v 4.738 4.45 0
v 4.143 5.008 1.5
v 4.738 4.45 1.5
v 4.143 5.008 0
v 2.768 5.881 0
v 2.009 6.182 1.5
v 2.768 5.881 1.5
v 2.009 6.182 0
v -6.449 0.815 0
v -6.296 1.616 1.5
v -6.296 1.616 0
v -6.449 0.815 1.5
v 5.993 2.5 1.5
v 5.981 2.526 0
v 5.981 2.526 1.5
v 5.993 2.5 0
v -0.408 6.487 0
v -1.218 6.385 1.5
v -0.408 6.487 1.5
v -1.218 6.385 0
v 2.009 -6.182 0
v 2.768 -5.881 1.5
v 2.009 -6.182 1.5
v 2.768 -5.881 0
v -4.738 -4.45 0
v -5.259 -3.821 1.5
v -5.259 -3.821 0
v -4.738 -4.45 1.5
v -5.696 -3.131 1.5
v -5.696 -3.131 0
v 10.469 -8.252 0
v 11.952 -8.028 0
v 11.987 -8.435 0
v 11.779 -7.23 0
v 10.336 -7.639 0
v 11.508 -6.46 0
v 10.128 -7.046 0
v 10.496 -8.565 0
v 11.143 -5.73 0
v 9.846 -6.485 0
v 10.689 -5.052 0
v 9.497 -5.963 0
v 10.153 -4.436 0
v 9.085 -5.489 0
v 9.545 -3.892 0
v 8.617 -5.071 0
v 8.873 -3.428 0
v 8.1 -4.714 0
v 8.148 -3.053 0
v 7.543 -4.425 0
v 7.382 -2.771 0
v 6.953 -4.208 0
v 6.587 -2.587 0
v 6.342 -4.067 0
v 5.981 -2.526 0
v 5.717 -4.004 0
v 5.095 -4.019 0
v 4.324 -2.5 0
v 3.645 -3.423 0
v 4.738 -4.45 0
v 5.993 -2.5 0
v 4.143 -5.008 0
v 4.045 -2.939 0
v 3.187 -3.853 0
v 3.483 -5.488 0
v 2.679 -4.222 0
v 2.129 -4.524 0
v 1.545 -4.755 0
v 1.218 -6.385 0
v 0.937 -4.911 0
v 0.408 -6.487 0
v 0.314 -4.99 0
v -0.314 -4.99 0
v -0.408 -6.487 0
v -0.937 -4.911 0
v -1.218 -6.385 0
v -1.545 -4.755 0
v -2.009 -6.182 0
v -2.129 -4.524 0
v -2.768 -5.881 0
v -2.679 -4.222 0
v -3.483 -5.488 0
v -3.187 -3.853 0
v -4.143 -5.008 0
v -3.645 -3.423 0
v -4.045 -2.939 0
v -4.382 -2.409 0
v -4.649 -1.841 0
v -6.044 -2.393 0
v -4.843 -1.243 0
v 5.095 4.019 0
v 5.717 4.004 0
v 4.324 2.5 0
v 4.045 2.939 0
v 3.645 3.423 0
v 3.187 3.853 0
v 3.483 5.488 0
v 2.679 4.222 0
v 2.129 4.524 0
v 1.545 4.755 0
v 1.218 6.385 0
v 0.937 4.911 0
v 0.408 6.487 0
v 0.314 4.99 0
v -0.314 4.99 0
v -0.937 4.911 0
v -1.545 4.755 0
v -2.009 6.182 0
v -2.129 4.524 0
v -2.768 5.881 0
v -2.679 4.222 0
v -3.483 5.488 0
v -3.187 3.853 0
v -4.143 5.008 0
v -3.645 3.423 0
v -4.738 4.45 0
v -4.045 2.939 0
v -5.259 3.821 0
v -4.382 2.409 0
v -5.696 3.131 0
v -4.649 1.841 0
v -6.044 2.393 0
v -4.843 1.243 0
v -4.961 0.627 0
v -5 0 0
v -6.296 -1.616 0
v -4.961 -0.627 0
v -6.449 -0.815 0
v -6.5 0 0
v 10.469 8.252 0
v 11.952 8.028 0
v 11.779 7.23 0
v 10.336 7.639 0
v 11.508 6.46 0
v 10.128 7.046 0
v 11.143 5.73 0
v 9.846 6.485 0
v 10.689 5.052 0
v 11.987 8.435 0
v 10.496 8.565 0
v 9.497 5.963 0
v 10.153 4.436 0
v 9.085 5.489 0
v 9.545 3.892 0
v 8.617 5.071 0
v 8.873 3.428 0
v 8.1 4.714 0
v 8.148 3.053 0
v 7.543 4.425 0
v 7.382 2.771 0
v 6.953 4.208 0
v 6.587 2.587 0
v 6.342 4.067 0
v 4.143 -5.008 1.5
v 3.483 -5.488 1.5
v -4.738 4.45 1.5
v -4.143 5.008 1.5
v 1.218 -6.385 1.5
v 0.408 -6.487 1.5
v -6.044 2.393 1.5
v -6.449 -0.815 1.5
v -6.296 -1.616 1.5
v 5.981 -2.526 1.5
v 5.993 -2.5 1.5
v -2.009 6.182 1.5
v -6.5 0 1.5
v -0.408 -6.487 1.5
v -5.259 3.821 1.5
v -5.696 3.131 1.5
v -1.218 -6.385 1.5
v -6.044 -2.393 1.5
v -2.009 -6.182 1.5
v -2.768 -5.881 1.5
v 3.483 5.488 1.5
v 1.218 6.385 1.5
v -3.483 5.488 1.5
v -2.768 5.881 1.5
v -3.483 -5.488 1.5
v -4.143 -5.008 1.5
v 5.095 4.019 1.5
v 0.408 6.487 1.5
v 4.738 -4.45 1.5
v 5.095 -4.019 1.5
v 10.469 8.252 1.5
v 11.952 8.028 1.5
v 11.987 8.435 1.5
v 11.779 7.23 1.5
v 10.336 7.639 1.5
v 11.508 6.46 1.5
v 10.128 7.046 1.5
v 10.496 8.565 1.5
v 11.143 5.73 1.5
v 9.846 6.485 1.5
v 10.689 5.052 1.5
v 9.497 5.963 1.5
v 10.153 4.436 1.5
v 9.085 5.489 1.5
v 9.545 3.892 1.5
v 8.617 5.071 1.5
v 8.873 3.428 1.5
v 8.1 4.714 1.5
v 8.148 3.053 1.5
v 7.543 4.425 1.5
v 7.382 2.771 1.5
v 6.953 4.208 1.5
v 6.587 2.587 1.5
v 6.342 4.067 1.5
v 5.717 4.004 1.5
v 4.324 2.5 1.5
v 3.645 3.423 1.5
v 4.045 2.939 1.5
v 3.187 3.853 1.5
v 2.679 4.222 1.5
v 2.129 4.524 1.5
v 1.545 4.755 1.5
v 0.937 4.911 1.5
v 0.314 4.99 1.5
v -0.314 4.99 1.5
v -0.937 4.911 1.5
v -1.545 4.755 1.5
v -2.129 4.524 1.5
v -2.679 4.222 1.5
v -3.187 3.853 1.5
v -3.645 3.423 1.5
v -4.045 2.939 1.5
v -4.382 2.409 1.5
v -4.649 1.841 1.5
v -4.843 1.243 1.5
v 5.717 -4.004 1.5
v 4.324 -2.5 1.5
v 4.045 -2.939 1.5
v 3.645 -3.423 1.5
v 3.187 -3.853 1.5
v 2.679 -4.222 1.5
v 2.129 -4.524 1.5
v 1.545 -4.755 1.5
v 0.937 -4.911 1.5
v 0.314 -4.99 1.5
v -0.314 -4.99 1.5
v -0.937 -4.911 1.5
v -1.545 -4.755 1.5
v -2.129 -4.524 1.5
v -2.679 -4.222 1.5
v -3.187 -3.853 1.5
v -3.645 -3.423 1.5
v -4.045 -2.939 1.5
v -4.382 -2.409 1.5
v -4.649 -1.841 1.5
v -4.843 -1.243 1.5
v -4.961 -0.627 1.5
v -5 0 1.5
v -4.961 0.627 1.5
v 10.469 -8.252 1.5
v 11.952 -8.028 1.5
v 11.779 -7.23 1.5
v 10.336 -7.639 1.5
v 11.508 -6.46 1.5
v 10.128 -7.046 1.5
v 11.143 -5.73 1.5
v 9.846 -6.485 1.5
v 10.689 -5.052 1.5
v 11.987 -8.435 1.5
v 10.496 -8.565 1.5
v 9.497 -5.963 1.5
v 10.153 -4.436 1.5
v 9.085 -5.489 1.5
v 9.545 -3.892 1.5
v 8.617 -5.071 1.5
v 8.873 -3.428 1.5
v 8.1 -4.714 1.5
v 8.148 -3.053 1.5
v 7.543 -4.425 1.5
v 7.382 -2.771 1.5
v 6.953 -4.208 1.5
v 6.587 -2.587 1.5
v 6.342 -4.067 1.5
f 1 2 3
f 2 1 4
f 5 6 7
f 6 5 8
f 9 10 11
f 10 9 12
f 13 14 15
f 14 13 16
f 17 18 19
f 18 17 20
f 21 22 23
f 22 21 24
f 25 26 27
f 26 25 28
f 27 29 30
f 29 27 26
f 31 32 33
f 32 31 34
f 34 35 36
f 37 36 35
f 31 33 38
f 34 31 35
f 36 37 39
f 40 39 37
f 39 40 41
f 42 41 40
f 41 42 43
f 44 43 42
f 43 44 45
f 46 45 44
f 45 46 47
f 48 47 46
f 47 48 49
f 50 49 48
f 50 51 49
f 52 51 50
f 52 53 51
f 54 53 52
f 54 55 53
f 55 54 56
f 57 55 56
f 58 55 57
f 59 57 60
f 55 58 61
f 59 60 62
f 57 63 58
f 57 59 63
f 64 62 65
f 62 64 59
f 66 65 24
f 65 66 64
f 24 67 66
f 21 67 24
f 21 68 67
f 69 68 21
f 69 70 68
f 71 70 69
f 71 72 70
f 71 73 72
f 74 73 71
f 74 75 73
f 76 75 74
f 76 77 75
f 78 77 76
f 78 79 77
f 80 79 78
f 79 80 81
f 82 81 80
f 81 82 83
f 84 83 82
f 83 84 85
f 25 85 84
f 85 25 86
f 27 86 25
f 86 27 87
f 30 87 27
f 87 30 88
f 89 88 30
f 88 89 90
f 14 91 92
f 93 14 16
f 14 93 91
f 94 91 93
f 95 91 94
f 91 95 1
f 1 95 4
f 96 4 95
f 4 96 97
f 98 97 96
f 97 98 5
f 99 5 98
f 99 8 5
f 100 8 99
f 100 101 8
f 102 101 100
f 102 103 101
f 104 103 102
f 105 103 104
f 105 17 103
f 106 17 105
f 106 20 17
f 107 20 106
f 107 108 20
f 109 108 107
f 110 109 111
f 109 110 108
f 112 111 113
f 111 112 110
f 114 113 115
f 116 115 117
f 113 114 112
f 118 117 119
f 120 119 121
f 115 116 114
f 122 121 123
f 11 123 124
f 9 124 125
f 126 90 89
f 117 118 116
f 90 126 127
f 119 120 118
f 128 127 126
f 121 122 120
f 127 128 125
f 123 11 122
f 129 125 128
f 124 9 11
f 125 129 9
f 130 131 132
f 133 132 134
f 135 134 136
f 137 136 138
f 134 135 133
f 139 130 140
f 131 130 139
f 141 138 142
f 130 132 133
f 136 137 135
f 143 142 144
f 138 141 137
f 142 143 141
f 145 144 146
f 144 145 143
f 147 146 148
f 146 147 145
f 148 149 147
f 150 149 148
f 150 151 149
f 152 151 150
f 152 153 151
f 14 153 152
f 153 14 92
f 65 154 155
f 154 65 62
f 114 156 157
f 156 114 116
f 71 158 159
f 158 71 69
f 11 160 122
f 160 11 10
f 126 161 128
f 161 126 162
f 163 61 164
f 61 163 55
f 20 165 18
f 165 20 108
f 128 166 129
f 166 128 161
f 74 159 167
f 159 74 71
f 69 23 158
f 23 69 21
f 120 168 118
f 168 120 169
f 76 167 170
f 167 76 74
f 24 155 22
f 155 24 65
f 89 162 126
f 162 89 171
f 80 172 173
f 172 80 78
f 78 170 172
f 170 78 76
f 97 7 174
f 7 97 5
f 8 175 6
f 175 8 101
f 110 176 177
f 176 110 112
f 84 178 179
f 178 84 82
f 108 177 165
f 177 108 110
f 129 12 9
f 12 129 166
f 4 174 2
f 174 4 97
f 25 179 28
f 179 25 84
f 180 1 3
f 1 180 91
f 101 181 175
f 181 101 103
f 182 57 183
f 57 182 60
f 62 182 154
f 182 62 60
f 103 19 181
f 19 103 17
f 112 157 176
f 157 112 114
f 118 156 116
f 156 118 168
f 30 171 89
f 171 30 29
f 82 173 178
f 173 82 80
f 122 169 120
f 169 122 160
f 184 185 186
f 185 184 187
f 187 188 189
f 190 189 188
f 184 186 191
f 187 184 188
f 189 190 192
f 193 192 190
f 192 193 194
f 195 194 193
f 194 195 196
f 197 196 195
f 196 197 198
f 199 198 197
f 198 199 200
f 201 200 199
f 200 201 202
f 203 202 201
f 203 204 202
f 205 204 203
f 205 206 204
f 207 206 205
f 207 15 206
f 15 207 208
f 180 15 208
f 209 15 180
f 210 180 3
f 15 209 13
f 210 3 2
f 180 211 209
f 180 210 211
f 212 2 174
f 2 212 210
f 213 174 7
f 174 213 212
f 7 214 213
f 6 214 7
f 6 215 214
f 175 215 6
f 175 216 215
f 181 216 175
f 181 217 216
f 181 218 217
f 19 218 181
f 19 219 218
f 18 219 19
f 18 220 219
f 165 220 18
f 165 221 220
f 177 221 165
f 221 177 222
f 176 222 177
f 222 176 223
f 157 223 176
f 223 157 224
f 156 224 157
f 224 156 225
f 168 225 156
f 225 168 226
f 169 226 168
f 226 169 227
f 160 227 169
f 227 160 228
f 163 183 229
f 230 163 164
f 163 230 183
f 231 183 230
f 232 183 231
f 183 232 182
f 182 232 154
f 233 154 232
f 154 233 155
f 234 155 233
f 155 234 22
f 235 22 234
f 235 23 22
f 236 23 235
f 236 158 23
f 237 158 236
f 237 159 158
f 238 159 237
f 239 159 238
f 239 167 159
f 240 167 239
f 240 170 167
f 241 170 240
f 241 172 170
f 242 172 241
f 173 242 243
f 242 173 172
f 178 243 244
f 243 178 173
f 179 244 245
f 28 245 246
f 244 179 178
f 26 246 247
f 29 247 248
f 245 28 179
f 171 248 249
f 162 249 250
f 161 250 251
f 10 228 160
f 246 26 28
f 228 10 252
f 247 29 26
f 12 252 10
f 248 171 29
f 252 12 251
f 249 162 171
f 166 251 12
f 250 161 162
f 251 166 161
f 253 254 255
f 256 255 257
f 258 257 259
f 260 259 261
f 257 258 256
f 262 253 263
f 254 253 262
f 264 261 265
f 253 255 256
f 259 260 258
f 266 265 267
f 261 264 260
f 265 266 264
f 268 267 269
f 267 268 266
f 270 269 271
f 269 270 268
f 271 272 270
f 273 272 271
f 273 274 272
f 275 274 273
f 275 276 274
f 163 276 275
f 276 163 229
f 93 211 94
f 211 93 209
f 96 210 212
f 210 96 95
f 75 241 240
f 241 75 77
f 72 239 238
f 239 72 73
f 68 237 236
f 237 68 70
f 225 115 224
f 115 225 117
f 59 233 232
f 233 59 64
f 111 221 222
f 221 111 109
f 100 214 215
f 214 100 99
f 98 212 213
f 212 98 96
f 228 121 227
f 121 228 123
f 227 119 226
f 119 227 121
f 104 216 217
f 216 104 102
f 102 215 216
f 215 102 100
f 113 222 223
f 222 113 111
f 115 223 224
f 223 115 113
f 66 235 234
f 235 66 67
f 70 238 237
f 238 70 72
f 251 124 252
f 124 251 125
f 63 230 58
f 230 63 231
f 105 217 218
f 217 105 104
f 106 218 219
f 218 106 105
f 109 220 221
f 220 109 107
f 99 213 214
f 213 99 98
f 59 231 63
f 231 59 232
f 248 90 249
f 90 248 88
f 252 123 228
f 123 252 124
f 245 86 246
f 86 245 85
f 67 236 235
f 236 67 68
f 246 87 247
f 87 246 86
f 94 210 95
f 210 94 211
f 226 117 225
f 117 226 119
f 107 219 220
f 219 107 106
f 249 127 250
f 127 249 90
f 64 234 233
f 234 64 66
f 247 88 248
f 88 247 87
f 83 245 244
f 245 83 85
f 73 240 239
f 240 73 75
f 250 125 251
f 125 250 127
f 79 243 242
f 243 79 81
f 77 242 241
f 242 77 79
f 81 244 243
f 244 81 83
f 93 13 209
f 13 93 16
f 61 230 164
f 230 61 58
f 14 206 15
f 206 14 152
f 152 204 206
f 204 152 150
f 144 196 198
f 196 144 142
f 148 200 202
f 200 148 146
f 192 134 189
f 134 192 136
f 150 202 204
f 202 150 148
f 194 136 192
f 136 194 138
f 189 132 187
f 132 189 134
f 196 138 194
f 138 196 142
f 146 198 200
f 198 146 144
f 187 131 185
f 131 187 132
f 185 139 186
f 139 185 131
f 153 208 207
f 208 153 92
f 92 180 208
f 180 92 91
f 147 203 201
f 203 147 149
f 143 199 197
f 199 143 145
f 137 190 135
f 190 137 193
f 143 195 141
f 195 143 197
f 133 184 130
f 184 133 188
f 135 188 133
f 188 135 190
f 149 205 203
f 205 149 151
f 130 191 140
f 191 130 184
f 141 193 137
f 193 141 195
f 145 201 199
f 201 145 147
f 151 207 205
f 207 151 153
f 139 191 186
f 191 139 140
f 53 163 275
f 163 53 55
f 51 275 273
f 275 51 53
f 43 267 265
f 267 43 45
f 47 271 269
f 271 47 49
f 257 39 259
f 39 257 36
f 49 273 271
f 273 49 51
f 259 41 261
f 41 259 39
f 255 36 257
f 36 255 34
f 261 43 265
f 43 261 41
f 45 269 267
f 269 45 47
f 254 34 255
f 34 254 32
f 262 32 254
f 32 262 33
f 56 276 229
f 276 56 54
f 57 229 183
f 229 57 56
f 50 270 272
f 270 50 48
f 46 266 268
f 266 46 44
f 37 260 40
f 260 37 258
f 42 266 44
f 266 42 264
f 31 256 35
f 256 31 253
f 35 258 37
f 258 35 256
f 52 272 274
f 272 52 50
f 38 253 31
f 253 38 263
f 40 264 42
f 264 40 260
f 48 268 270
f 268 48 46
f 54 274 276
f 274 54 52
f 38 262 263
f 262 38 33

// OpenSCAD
ScrewDiameter = 10;
Thikness = 1.5;

/* [HIDDEN] */
$fn = 50;

clip();

module clip(){
    difference(){
        cylinderHole(ScrewDiameter/2,Thikness);        
        translate([ScrewDiameter/4,-ScrewDiameter/4,-0.25]) 
            cube([ScrewDiameter*1.5,ScrewDiameter/2,Thikness+0.5]);
        
    }
    translate([ScrewDiameter/2+Thikness*0.35,ScrewDiameter*0.75+Thikness,0])
        rotate([0,0,-95])
            quarterCylinder();
    rotate([180,0,0])    
        translate([ScrewDiameter/2+Thikness*0.35,ScrewDiameter*0.75+Thikness,-Thikness])
            rotate([0,0,-95])
                quarterCylinder();
}

module cylinderHole(external, thickness){
    difference(){
        cylinder(r=external+thickness,h=thickness);
        translate([0,0,-0.25]) 
            cylinder(r=external,h=thickness+0.5);
    }
}
module quarterCylinder(external=ScrewDiameter/2,thickness=Thikness){
    intersection(){
        cylinderHole(external,thickness);
        translate([0,0,-0.5]) cube([external*2,external*2,thickness+1]);
    }    
}
